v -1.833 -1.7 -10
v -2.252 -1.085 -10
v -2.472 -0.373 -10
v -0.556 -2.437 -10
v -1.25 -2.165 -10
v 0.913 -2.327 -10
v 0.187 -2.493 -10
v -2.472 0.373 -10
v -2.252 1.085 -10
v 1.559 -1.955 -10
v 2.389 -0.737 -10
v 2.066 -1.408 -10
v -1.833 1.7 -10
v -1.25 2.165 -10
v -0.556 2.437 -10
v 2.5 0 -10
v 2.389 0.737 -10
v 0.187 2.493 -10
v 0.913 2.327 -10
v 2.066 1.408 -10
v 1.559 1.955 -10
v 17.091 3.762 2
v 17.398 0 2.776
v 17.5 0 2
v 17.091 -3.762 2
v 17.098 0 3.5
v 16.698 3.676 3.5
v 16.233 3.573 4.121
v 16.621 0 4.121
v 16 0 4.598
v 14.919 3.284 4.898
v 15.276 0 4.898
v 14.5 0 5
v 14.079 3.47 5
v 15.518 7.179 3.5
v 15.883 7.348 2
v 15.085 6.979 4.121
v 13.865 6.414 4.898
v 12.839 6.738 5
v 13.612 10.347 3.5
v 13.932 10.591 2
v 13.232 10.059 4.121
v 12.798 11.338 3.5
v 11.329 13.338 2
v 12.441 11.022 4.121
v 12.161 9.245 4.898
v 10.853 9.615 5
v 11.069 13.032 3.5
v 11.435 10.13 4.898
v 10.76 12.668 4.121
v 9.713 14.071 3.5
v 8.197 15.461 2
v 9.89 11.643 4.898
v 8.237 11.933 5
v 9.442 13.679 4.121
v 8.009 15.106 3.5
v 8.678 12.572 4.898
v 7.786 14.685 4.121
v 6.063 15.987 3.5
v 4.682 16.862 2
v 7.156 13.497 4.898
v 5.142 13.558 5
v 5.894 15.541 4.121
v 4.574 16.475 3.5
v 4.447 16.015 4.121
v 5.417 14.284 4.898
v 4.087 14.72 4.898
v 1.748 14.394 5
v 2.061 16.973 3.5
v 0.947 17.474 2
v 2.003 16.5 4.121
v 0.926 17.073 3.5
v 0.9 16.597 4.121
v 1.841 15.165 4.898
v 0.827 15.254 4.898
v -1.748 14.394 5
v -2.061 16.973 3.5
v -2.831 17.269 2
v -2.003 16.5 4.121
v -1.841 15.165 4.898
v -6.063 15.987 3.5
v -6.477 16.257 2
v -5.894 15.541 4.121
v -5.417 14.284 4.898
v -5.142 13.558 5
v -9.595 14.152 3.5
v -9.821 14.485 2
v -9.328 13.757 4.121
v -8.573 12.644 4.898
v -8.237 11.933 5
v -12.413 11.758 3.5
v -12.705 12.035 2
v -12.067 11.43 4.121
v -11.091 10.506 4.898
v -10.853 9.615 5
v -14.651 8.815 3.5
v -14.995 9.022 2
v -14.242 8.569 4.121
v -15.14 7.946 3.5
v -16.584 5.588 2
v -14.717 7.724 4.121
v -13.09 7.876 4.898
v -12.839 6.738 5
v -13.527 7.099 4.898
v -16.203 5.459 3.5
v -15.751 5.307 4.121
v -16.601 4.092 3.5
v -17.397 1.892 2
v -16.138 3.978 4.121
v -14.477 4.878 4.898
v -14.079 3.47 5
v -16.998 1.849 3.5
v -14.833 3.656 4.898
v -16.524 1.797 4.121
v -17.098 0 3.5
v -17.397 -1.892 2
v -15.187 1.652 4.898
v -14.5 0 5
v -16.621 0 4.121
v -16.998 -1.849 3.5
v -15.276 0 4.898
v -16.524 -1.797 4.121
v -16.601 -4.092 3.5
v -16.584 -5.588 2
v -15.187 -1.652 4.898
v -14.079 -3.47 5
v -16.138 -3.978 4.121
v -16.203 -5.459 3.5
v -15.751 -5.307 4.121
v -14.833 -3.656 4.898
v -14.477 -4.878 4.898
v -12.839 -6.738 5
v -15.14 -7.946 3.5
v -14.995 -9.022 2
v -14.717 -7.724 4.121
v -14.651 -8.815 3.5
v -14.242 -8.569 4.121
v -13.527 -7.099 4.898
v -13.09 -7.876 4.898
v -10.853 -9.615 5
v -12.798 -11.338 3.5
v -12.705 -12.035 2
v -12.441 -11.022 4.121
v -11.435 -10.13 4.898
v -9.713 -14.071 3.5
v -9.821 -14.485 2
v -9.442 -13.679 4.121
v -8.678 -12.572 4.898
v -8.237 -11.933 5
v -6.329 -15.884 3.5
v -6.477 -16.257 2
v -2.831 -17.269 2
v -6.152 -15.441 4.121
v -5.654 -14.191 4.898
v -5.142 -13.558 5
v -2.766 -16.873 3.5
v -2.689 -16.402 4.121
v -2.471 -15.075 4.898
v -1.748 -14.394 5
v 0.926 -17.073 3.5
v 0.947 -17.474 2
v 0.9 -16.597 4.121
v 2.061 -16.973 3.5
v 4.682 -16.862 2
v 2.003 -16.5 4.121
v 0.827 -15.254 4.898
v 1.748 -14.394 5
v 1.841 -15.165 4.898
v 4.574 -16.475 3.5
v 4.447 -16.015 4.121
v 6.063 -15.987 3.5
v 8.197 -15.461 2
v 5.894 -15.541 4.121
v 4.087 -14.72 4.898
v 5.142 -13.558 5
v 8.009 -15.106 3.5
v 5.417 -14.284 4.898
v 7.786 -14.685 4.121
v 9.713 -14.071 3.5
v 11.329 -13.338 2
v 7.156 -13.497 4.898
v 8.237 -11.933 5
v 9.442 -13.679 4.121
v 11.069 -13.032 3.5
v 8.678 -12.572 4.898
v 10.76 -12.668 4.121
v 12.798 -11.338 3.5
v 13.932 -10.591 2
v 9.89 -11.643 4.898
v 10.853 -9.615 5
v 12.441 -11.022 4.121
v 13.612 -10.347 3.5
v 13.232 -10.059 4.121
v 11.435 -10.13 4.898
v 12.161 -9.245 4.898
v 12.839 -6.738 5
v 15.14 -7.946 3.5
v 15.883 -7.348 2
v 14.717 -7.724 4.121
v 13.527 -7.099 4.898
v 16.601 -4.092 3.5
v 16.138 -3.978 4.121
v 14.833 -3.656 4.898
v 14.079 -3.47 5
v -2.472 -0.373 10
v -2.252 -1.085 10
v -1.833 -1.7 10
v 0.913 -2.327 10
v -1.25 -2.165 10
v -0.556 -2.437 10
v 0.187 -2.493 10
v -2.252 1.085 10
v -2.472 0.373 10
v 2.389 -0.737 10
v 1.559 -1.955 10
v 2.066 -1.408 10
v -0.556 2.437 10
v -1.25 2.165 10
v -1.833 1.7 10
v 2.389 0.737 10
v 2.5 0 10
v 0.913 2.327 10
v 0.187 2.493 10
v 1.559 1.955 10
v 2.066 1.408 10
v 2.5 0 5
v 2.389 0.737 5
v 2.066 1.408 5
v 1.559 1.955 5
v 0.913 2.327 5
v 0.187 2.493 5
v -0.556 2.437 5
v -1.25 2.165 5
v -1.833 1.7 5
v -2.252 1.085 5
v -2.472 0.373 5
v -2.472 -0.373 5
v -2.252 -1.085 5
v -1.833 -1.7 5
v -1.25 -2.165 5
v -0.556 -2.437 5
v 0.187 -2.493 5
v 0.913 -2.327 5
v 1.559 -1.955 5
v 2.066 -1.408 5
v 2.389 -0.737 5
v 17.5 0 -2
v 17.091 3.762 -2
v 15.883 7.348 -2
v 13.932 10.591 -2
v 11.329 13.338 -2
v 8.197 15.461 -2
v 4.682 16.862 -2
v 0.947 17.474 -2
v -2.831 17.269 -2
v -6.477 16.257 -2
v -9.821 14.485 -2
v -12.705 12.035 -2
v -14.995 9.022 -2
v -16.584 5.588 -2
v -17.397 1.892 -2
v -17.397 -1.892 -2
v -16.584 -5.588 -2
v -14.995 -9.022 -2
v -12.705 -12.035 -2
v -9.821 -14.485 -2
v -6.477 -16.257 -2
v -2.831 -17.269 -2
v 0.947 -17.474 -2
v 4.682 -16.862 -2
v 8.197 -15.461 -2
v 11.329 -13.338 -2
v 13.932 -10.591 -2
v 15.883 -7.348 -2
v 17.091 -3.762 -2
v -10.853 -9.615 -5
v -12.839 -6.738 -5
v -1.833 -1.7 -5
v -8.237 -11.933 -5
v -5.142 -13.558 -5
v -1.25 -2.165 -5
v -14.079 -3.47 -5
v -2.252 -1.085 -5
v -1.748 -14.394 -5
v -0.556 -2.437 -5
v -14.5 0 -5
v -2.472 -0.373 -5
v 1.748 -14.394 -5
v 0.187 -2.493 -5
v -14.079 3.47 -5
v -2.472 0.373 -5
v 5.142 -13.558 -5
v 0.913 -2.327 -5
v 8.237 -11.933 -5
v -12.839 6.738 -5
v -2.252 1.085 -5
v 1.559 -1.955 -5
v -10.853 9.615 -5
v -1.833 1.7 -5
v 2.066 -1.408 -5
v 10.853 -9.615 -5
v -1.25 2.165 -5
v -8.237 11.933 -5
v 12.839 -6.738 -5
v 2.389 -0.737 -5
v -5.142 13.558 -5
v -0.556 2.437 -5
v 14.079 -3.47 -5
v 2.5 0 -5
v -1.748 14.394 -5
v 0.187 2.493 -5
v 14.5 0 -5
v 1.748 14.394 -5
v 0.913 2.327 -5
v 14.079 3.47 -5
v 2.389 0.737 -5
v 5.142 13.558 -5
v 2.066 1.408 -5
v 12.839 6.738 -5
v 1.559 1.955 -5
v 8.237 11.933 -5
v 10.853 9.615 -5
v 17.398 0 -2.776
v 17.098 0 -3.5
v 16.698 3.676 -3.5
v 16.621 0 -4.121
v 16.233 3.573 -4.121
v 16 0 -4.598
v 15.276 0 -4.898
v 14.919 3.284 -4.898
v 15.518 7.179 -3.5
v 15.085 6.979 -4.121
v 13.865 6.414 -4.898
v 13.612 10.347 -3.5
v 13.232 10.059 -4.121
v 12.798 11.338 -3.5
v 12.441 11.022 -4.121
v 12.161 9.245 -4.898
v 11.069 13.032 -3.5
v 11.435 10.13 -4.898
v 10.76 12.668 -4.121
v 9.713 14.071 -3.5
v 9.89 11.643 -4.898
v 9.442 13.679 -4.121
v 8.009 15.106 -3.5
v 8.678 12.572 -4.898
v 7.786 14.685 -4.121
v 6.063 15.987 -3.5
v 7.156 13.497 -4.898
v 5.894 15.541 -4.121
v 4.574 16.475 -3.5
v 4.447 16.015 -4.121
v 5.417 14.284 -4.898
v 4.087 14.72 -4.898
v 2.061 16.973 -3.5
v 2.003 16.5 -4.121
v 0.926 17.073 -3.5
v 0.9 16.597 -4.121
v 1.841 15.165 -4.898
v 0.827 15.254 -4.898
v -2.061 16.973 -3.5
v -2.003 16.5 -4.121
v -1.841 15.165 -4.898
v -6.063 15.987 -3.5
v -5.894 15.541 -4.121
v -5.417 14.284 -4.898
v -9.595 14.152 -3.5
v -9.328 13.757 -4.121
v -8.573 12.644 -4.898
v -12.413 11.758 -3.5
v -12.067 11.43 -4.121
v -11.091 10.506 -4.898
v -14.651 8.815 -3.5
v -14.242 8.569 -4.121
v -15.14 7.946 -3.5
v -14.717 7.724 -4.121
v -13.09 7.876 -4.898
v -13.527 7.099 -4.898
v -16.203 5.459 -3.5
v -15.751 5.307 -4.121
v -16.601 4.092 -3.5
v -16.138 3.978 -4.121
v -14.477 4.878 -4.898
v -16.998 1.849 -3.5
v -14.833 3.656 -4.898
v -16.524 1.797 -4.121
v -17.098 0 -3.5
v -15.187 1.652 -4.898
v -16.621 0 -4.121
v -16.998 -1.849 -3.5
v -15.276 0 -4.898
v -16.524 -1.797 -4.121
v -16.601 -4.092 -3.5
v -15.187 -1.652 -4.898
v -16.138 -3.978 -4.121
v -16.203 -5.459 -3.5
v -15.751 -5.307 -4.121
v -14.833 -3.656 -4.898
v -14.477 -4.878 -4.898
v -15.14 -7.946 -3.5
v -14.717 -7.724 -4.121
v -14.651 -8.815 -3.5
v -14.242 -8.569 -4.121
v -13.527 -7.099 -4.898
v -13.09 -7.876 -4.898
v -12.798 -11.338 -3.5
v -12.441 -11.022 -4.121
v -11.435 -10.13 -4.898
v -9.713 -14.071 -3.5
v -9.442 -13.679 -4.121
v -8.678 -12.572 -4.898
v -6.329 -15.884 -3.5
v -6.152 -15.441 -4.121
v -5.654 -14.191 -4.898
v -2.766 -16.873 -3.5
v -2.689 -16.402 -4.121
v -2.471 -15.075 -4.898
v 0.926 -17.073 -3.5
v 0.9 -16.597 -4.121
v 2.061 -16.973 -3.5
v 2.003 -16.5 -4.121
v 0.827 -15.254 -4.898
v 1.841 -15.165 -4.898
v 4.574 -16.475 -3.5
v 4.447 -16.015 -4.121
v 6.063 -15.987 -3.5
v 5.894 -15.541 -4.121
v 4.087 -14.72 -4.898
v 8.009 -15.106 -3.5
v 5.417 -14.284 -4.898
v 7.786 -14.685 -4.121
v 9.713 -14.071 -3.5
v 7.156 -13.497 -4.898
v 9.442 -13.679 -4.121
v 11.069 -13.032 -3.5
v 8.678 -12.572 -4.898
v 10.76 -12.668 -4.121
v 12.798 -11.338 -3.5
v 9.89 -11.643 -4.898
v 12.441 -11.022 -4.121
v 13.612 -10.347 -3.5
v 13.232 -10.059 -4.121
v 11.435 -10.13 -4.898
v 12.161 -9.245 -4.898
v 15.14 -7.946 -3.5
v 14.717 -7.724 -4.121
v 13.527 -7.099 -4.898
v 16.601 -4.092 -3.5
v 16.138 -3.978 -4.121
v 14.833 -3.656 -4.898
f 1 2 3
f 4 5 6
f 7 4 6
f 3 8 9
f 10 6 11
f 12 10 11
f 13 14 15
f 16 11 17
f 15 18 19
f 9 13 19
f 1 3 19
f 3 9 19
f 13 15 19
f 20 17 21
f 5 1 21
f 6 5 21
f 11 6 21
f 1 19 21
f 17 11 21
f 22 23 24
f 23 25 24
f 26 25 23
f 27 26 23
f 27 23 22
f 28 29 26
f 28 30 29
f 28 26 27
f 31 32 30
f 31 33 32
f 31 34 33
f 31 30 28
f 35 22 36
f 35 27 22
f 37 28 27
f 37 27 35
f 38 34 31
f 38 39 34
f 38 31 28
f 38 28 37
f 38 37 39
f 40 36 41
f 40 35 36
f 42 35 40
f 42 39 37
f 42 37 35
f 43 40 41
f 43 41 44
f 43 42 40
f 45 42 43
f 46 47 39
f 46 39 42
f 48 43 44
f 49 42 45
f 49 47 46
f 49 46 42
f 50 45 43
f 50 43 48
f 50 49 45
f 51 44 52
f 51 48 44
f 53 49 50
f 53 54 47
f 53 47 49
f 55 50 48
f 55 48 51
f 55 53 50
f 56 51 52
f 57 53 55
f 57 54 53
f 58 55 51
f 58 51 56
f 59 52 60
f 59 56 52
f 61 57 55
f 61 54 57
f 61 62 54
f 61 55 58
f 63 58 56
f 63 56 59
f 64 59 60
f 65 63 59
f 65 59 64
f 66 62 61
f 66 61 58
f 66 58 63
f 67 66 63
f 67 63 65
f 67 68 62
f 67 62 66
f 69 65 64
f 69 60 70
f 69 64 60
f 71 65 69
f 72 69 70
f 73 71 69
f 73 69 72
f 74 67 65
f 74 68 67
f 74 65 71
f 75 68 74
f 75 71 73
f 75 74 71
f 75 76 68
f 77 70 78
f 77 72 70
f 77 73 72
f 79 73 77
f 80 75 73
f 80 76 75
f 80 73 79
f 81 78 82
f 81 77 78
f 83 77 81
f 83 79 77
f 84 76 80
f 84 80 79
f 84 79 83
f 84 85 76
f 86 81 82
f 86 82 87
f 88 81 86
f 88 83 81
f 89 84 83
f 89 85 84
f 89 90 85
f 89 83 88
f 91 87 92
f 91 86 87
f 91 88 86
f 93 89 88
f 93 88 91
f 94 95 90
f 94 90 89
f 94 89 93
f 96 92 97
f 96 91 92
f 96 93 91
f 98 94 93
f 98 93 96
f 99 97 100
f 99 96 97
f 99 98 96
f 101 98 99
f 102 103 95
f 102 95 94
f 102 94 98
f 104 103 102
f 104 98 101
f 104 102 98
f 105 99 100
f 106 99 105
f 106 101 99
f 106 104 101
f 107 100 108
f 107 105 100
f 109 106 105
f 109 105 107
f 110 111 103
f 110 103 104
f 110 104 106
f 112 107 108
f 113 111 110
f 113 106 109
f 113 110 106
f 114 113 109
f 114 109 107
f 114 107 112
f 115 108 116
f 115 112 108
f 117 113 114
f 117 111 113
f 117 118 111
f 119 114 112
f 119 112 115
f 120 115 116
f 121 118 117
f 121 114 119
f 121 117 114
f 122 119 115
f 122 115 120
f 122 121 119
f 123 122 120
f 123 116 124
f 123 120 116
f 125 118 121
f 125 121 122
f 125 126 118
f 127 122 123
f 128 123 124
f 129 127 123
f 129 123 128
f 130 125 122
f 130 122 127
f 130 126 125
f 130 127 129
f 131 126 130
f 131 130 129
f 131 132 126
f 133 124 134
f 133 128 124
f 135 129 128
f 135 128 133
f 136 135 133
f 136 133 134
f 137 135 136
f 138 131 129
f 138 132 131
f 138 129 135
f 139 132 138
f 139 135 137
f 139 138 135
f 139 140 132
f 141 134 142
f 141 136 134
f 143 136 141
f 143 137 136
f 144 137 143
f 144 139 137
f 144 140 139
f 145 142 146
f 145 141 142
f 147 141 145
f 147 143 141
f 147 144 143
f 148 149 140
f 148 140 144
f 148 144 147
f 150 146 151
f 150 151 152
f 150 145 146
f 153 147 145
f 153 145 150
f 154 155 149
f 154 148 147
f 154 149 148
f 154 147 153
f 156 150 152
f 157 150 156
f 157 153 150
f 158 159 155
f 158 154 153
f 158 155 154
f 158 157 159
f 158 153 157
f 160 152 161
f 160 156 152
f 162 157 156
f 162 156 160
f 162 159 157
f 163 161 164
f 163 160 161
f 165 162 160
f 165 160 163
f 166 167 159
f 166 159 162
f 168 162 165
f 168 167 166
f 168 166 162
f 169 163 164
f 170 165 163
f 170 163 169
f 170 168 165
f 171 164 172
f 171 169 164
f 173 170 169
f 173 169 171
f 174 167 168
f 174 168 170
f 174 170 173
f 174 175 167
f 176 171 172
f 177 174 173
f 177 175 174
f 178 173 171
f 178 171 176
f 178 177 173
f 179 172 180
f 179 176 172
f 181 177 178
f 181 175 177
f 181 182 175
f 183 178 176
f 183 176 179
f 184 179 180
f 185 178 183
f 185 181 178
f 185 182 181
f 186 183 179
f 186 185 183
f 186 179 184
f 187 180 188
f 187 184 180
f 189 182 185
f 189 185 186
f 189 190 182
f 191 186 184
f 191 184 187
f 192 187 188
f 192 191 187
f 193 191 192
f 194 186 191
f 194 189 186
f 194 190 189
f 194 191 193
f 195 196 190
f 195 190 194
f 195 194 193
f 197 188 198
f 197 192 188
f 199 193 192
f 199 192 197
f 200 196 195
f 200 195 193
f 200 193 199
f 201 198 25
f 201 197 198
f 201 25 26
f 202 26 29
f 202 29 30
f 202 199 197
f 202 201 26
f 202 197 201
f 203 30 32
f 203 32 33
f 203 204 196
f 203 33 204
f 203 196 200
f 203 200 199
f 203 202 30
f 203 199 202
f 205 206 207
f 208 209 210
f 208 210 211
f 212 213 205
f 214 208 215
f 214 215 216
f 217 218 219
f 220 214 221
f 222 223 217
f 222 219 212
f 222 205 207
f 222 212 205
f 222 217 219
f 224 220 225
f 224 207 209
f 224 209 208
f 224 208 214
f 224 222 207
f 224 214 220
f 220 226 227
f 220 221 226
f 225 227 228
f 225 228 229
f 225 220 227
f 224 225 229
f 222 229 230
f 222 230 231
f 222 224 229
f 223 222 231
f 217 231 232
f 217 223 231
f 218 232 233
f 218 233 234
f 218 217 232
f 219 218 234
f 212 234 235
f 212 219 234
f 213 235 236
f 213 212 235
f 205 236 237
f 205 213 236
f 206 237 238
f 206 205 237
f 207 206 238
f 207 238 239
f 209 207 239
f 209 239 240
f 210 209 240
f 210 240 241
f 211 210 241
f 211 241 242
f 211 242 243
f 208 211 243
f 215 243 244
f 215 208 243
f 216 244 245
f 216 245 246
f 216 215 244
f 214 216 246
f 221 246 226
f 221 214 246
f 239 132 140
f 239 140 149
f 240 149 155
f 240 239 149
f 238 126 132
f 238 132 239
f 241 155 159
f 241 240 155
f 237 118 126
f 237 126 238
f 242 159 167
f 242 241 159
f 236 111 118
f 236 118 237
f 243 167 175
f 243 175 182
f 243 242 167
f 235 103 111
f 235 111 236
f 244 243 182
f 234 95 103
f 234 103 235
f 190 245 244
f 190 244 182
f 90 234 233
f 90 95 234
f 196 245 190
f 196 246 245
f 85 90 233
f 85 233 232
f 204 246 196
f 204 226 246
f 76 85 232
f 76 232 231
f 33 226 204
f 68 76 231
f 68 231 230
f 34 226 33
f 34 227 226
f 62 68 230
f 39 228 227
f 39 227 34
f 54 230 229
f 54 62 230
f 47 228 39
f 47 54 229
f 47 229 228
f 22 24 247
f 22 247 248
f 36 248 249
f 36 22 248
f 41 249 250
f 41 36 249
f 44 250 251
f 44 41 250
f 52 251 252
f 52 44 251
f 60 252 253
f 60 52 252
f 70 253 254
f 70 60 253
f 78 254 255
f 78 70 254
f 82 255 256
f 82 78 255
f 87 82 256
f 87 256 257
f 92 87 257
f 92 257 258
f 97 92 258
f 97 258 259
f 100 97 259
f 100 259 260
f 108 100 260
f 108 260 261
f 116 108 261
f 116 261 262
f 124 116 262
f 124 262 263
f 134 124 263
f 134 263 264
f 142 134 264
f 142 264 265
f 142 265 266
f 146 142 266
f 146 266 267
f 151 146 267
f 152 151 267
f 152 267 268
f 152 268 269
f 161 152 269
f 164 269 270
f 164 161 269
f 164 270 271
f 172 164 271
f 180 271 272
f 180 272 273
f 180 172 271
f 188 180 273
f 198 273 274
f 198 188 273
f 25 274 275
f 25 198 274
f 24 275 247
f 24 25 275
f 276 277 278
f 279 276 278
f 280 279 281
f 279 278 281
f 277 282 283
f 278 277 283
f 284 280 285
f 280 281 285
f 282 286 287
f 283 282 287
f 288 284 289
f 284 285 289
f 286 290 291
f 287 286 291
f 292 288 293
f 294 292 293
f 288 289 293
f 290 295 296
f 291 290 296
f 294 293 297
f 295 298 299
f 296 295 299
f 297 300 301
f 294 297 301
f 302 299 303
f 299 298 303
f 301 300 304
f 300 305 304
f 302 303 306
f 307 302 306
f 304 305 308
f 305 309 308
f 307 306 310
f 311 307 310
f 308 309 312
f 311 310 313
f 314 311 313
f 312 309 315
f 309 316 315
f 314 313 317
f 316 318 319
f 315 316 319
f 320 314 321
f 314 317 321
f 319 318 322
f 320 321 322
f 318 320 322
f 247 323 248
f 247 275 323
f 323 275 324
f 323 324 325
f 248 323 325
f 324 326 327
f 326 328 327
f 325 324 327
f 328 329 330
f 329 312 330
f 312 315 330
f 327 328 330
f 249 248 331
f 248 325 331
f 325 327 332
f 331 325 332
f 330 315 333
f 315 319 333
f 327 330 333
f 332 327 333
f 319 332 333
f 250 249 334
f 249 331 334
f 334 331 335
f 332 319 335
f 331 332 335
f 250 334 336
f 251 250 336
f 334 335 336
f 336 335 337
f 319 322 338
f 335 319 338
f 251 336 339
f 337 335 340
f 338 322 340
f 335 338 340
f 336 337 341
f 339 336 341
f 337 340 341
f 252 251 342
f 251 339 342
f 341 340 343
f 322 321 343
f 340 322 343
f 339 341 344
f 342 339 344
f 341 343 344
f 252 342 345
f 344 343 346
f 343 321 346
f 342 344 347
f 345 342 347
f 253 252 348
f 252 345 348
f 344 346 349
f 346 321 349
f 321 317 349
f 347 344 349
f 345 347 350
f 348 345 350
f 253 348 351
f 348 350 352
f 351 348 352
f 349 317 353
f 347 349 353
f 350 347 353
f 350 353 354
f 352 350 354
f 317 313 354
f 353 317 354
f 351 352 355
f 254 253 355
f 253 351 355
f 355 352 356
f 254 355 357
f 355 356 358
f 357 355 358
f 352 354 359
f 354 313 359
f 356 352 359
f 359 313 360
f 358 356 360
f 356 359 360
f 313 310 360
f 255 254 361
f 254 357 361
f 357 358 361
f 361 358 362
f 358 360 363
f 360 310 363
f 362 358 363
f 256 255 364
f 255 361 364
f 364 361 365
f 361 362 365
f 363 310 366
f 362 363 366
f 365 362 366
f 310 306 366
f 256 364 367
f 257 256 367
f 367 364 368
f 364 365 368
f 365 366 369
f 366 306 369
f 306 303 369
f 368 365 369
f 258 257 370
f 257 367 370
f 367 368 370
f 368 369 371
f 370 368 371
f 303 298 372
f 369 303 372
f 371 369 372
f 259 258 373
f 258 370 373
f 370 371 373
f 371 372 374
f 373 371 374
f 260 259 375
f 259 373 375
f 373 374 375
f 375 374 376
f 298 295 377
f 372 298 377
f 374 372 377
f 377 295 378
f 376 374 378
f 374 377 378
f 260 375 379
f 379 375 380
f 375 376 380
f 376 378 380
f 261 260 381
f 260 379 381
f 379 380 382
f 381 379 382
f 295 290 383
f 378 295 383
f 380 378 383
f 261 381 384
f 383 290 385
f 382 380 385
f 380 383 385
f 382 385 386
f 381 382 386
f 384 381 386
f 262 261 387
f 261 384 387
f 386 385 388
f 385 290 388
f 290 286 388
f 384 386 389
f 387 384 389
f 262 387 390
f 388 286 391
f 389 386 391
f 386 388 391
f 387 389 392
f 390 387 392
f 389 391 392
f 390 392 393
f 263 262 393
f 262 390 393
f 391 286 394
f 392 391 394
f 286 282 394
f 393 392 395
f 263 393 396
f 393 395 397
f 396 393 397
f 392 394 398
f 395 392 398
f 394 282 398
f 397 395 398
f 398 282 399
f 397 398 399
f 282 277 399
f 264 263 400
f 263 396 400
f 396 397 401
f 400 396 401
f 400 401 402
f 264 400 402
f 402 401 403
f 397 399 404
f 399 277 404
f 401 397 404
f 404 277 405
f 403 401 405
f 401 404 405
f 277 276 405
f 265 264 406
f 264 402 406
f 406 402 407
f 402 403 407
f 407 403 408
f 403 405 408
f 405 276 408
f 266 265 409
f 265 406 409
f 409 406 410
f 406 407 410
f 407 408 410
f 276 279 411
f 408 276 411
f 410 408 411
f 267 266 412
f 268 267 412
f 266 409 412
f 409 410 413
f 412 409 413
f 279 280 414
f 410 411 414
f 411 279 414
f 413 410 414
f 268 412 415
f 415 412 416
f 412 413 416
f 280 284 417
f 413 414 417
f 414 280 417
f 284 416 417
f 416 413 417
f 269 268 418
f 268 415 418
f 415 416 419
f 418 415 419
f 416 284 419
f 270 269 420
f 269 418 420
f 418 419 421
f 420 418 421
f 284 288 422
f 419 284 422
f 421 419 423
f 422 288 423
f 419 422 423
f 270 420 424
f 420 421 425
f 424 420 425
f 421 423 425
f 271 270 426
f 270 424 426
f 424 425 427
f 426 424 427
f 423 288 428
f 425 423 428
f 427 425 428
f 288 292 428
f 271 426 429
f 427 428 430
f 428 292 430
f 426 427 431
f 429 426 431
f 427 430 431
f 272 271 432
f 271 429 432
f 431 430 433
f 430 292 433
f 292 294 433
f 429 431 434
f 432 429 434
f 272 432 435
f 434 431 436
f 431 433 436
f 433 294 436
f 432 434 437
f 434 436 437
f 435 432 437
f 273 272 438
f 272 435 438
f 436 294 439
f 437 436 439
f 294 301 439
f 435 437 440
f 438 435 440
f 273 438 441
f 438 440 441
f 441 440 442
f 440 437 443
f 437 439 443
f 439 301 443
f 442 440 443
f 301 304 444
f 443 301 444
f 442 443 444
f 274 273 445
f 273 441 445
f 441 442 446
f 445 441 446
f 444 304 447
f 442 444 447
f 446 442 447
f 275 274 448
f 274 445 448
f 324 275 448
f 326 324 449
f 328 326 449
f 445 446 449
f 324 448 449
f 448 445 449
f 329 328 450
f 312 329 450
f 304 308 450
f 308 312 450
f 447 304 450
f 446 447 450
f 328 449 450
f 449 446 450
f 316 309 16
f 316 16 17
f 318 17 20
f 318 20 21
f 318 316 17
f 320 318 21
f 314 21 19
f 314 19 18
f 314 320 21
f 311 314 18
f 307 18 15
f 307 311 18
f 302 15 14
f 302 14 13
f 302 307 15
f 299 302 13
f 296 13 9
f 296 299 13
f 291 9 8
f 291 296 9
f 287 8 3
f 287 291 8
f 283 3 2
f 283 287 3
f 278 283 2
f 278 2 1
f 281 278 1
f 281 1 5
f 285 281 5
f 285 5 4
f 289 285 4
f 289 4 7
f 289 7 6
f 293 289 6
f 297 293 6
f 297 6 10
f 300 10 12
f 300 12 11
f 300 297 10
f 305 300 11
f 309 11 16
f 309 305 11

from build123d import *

# Parameters (mm, degrees)
SKETCH1_R           = 17.5
BOSS_EXTRUDE1_DEPTH = 5
FILLET1_R           = 3
SKETCH2_R           = 2.5
BOSS_EXTRUDE2_DEPTH = 10


with BuildPart() as part:
    # Sketch1 → Boss-Extrude1 (new, symmetric)
    with BuildSketch(Plane.XY):
        Circle(SKETCH1_R)
    extrude(amount=BOSS_EXTRUDE1_DEPTH, both=True)

    # Fillet1
    fillet1_edges = [part.edges().sort_by_distance(p)[0] for p in [
        (-17.5, 0, -5),
        (-17.5, 0, 5),
    ]]
    fillet(fillet1_edges, radius=FILLET1_R)

    # Sketch2 → Boss-Extrude2 (add, symmetric)
    with BuildSketch(Plane.XY):
        Circle(SKETCH2_R)
    extrude(amount=BOSS_EXTRUDE2_DEPTH, both=True)


solid = part.part
